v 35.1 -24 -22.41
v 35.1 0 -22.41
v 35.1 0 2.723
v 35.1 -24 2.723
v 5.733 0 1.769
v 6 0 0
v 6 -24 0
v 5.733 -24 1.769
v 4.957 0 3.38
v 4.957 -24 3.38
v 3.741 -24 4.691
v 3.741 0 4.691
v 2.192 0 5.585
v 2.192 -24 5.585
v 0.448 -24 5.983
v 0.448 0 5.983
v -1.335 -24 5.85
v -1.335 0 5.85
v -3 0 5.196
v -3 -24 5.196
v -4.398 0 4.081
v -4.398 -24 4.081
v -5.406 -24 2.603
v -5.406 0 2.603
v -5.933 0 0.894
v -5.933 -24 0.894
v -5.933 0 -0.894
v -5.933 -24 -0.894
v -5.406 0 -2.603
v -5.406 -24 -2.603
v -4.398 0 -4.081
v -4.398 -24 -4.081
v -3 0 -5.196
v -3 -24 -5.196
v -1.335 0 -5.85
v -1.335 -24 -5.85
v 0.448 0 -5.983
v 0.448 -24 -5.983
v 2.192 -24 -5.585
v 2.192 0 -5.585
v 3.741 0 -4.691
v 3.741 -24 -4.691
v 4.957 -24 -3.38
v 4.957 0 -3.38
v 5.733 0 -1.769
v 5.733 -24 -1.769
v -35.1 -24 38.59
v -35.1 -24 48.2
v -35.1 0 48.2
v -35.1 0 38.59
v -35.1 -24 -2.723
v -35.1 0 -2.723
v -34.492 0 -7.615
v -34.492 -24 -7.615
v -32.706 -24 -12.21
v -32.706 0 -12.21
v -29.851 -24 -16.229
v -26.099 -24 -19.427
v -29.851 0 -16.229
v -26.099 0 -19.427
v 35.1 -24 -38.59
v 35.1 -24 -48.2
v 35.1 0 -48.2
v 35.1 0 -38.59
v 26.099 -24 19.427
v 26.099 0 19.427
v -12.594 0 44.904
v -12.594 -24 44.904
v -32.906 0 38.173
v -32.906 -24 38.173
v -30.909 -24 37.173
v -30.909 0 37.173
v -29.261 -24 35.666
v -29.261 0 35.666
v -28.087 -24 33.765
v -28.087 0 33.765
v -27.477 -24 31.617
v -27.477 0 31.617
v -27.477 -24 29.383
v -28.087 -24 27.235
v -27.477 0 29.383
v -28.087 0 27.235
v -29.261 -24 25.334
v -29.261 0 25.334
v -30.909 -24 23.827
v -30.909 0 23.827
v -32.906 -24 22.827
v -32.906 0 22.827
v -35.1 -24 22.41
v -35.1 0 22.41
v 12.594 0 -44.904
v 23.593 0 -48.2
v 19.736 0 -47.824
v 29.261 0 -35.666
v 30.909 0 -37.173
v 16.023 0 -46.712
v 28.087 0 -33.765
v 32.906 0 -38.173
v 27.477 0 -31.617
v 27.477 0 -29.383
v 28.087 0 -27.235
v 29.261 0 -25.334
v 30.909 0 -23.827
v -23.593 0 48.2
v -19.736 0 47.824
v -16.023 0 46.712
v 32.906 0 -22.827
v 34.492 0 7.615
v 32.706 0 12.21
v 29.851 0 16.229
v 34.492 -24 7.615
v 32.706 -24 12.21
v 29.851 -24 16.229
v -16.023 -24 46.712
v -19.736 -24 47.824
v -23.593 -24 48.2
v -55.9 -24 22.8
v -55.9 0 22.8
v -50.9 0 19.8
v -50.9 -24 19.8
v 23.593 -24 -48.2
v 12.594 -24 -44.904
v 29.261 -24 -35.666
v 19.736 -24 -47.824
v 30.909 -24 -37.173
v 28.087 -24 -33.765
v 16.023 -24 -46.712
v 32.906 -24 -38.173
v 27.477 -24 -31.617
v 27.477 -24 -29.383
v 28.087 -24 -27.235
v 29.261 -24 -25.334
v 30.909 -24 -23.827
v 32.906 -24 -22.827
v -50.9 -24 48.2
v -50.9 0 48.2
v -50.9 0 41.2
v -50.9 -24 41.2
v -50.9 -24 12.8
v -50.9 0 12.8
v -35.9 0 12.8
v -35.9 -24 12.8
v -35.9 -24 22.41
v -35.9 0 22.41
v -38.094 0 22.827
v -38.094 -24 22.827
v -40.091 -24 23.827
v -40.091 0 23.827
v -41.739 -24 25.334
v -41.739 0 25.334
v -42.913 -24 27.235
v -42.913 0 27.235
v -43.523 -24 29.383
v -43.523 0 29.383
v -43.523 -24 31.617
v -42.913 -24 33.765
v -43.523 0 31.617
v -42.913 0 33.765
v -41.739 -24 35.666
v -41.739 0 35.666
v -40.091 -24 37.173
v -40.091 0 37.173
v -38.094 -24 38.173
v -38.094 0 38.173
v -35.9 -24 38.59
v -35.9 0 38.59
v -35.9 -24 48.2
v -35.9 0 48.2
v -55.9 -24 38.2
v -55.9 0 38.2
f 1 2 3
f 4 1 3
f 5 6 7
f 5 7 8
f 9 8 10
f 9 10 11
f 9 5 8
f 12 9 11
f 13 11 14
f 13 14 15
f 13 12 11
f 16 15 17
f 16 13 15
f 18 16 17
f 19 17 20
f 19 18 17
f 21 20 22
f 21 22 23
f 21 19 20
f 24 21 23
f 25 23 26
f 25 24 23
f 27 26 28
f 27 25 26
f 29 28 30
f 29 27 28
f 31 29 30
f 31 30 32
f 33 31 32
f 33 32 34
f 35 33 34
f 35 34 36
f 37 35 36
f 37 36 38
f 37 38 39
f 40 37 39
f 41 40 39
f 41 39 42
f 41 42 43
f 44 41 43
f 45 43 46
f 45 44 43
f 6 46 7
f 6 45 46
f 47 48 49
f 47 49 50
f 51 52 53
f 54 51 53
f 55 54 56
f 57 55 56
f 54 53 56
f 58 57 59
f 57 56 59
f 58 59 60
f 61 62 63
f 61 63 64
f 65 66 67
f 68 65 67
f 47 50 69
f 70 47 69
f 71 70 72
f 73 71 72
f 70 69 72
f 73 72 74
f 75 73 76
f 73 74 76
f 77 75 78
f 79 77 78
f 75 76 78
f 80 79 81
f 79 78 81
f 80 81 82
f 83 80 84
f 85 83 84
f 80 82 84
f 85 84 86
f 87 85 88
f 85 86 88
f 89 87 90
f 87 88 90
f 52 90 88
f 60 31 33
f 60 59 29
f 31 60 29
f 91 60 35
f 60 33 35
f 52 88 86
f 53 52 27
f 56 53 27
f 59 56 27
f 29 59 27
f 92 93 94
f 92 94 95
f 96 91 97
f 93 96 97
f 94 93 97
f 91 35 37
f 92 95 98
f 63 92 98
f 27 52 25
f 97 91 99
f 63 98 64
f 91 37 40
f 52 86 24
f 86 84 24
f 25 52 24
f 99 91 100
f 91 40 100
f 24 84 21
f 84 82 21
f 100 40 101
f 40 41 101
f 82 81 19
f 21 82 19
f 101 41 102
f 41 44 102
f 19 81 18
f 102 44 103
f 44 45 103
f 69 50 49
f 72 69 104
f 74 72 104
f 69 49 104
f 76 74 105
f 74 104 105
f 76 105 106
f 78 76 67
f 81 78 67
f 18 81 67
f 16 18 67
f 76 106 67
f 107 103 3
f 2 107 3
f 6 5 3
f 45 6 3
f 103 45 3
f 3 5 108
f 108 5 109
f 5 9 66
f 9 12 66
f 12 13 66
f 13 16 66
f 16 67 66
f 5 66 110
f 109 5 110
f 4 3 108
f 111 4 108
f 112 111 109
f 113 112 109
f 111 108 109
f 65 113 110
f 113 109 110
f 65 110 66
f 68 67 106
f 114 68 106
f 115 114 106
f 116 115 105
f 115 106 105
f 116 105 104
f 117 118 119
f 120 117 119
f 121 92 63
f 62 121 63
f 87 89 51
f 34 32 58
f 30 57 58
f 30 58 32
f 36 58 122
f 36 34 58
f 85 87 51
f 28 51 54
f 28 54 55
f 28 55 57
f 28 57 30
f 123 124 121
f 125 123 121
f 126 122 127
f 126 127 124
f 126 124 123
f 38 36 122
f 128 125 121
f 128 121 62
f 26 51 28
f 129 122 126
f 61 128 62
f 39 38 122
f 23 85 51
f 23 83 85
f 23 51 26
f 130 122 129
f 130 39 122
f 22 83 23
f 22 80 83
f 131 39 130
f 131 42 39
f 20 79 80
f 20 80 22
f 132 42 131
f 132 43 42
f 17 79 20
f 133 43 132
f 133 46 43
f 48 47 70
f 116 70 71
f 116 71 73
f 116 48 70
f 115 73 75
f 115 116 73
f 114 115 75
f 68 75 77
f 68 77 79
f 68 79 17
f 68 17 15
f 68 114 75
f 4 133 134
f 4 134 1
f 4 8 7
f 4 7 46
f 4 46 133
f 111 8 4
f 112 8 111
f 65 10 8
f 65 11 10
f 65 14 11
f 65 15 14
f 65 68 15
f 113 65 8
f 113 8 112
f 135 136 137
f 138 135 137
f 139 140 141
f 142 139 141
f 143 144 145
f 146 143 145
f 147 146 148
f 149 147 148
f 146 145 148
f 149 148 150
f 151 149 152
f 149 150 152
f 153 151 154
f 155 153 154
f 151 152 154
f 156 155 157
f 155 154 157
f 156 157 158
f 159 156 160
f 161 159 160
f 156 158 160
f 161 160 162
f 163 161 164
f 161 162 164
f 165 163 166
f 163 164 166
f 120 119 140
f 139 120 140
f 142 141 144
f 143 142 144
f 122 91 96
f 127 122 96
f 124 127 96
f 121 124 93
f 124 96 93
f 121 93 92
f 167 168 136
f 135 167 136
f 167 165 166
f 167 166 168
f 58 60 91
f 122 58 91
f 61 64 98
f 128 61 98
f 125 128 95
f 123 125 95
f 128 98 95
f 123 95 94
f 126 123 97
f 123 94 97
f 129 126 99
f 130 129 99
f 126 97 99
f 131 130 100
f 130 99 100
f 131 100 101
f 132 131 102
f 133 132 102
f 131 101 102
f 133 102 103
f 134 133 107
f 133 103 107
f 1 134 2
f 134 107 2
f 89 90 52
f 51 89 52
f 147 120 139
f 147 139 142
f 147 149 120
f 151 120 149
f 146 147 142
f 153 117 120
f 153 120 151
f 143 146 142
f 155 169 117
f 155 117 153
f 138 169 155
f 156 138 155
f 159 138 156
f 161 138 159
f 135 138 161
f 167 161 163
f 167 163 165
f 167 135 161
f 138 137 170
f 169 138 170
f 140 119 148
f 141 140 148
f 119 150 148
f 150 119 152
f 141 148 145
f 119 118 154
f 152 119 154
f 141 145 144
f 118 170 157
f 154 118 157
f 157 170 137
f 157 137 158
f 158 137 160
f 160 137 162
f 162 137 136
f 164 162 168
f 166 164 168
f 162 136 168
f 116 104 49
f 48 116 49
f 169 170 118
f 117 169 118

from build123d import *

# Parameters (mm, degrees)
F1_DEPTH = 24
F0_R     = 6
F2_DEPTH = 24


with BuildPart() as f1:
    # F0 (on Front) → F1 (new body)
    with BuildSketch(Plane.XZ):
        with BuildLine():
            Line((-35.9, 38.590117), (-35.9, 48.2))
            Line((-35.9, 48.2), (-50.9, 48.2))
            Line((-50.9, 48.2), (-50.9, 41.2))
            Line((-50.9, 41.2), (-55.9, 38.2))
            Line((-55.9, 38.2), (-55.9, 22.8))
            Line((-55.9, 22.8), (-50.9, 19.8))
            Line((-50.9, 19.8), (-50.9, 12.8))
            Line((-50.9, 12.8), (-35.9, 12.8))
            Line((-35.9, 12.8), (-35.9, 22.409883))
            ThreePointArc((-35.9, 22.409883), (-43.6, 30.5), (-35.9, 38.590117))
        make_face()
    extrude(amount=F1_DEPTH)


with BuildPart() as f2:
    # F0 (on Front) → F2 (new body)
    with BuildSketch(Plane.XZ):
        with BuildLine():
            ThreePointArc((-35.1, 38.590117), (-27.4, 30.5), (-35.1, 22.409883))
            Line((-35.1, 22.409883), (-35.1, 12.8))
            Line((-35.1, 12.8), (-35.1, 0))
            Line((-35.1, 0), (-35.1, -2.722703))
            ThreePointArc((-35.1, -2.722703), (-32.706457, -12.210204), (-26.098733, -19.426831))
            Line((-26.098733, -19.426831), (12.594453, -44.904127))
            ThreePointArc((12.594453, -44.904127), (17.852217, -47.358321), (23.593186, -48.2))
            Line((23.593186, -48.2), (35.1, -48.2))
            Line((35.1, -48.2), (35.1, -38.590117))
            ThreePointArc((35.1, -38.590117), (27.4, -30.5), (35.1, -22.409883))
            Line((35.1, -22.409883), (35.1, -12.8))
            Line((35.1, -12.8), (35.1, 0))
            Line((35.1, 0), (35.1, 2.722703))
            ThreePointArc((35.1, 2.722703), (32.706457, 12.210204), (26.098733, 19.426831))
            Line((26.098733, 19.426831), (-12.594453, 44.904127))
            ThreePointArc((-12.594453, 44.904127), (-17.852217, 47.358321), (-23.593186, 48.2))
            Line((-23.593186, 48.2), (-35.1, 48.2))
            Line((-35.1, 48.2), (-35.1, 38.590117))
        make_face()
        Circle(F0_R, mode=Mode.SUBTRACT)
    extrude(amount=F2_DEPTH)


solid = Compound([f1.part, f2.part])
